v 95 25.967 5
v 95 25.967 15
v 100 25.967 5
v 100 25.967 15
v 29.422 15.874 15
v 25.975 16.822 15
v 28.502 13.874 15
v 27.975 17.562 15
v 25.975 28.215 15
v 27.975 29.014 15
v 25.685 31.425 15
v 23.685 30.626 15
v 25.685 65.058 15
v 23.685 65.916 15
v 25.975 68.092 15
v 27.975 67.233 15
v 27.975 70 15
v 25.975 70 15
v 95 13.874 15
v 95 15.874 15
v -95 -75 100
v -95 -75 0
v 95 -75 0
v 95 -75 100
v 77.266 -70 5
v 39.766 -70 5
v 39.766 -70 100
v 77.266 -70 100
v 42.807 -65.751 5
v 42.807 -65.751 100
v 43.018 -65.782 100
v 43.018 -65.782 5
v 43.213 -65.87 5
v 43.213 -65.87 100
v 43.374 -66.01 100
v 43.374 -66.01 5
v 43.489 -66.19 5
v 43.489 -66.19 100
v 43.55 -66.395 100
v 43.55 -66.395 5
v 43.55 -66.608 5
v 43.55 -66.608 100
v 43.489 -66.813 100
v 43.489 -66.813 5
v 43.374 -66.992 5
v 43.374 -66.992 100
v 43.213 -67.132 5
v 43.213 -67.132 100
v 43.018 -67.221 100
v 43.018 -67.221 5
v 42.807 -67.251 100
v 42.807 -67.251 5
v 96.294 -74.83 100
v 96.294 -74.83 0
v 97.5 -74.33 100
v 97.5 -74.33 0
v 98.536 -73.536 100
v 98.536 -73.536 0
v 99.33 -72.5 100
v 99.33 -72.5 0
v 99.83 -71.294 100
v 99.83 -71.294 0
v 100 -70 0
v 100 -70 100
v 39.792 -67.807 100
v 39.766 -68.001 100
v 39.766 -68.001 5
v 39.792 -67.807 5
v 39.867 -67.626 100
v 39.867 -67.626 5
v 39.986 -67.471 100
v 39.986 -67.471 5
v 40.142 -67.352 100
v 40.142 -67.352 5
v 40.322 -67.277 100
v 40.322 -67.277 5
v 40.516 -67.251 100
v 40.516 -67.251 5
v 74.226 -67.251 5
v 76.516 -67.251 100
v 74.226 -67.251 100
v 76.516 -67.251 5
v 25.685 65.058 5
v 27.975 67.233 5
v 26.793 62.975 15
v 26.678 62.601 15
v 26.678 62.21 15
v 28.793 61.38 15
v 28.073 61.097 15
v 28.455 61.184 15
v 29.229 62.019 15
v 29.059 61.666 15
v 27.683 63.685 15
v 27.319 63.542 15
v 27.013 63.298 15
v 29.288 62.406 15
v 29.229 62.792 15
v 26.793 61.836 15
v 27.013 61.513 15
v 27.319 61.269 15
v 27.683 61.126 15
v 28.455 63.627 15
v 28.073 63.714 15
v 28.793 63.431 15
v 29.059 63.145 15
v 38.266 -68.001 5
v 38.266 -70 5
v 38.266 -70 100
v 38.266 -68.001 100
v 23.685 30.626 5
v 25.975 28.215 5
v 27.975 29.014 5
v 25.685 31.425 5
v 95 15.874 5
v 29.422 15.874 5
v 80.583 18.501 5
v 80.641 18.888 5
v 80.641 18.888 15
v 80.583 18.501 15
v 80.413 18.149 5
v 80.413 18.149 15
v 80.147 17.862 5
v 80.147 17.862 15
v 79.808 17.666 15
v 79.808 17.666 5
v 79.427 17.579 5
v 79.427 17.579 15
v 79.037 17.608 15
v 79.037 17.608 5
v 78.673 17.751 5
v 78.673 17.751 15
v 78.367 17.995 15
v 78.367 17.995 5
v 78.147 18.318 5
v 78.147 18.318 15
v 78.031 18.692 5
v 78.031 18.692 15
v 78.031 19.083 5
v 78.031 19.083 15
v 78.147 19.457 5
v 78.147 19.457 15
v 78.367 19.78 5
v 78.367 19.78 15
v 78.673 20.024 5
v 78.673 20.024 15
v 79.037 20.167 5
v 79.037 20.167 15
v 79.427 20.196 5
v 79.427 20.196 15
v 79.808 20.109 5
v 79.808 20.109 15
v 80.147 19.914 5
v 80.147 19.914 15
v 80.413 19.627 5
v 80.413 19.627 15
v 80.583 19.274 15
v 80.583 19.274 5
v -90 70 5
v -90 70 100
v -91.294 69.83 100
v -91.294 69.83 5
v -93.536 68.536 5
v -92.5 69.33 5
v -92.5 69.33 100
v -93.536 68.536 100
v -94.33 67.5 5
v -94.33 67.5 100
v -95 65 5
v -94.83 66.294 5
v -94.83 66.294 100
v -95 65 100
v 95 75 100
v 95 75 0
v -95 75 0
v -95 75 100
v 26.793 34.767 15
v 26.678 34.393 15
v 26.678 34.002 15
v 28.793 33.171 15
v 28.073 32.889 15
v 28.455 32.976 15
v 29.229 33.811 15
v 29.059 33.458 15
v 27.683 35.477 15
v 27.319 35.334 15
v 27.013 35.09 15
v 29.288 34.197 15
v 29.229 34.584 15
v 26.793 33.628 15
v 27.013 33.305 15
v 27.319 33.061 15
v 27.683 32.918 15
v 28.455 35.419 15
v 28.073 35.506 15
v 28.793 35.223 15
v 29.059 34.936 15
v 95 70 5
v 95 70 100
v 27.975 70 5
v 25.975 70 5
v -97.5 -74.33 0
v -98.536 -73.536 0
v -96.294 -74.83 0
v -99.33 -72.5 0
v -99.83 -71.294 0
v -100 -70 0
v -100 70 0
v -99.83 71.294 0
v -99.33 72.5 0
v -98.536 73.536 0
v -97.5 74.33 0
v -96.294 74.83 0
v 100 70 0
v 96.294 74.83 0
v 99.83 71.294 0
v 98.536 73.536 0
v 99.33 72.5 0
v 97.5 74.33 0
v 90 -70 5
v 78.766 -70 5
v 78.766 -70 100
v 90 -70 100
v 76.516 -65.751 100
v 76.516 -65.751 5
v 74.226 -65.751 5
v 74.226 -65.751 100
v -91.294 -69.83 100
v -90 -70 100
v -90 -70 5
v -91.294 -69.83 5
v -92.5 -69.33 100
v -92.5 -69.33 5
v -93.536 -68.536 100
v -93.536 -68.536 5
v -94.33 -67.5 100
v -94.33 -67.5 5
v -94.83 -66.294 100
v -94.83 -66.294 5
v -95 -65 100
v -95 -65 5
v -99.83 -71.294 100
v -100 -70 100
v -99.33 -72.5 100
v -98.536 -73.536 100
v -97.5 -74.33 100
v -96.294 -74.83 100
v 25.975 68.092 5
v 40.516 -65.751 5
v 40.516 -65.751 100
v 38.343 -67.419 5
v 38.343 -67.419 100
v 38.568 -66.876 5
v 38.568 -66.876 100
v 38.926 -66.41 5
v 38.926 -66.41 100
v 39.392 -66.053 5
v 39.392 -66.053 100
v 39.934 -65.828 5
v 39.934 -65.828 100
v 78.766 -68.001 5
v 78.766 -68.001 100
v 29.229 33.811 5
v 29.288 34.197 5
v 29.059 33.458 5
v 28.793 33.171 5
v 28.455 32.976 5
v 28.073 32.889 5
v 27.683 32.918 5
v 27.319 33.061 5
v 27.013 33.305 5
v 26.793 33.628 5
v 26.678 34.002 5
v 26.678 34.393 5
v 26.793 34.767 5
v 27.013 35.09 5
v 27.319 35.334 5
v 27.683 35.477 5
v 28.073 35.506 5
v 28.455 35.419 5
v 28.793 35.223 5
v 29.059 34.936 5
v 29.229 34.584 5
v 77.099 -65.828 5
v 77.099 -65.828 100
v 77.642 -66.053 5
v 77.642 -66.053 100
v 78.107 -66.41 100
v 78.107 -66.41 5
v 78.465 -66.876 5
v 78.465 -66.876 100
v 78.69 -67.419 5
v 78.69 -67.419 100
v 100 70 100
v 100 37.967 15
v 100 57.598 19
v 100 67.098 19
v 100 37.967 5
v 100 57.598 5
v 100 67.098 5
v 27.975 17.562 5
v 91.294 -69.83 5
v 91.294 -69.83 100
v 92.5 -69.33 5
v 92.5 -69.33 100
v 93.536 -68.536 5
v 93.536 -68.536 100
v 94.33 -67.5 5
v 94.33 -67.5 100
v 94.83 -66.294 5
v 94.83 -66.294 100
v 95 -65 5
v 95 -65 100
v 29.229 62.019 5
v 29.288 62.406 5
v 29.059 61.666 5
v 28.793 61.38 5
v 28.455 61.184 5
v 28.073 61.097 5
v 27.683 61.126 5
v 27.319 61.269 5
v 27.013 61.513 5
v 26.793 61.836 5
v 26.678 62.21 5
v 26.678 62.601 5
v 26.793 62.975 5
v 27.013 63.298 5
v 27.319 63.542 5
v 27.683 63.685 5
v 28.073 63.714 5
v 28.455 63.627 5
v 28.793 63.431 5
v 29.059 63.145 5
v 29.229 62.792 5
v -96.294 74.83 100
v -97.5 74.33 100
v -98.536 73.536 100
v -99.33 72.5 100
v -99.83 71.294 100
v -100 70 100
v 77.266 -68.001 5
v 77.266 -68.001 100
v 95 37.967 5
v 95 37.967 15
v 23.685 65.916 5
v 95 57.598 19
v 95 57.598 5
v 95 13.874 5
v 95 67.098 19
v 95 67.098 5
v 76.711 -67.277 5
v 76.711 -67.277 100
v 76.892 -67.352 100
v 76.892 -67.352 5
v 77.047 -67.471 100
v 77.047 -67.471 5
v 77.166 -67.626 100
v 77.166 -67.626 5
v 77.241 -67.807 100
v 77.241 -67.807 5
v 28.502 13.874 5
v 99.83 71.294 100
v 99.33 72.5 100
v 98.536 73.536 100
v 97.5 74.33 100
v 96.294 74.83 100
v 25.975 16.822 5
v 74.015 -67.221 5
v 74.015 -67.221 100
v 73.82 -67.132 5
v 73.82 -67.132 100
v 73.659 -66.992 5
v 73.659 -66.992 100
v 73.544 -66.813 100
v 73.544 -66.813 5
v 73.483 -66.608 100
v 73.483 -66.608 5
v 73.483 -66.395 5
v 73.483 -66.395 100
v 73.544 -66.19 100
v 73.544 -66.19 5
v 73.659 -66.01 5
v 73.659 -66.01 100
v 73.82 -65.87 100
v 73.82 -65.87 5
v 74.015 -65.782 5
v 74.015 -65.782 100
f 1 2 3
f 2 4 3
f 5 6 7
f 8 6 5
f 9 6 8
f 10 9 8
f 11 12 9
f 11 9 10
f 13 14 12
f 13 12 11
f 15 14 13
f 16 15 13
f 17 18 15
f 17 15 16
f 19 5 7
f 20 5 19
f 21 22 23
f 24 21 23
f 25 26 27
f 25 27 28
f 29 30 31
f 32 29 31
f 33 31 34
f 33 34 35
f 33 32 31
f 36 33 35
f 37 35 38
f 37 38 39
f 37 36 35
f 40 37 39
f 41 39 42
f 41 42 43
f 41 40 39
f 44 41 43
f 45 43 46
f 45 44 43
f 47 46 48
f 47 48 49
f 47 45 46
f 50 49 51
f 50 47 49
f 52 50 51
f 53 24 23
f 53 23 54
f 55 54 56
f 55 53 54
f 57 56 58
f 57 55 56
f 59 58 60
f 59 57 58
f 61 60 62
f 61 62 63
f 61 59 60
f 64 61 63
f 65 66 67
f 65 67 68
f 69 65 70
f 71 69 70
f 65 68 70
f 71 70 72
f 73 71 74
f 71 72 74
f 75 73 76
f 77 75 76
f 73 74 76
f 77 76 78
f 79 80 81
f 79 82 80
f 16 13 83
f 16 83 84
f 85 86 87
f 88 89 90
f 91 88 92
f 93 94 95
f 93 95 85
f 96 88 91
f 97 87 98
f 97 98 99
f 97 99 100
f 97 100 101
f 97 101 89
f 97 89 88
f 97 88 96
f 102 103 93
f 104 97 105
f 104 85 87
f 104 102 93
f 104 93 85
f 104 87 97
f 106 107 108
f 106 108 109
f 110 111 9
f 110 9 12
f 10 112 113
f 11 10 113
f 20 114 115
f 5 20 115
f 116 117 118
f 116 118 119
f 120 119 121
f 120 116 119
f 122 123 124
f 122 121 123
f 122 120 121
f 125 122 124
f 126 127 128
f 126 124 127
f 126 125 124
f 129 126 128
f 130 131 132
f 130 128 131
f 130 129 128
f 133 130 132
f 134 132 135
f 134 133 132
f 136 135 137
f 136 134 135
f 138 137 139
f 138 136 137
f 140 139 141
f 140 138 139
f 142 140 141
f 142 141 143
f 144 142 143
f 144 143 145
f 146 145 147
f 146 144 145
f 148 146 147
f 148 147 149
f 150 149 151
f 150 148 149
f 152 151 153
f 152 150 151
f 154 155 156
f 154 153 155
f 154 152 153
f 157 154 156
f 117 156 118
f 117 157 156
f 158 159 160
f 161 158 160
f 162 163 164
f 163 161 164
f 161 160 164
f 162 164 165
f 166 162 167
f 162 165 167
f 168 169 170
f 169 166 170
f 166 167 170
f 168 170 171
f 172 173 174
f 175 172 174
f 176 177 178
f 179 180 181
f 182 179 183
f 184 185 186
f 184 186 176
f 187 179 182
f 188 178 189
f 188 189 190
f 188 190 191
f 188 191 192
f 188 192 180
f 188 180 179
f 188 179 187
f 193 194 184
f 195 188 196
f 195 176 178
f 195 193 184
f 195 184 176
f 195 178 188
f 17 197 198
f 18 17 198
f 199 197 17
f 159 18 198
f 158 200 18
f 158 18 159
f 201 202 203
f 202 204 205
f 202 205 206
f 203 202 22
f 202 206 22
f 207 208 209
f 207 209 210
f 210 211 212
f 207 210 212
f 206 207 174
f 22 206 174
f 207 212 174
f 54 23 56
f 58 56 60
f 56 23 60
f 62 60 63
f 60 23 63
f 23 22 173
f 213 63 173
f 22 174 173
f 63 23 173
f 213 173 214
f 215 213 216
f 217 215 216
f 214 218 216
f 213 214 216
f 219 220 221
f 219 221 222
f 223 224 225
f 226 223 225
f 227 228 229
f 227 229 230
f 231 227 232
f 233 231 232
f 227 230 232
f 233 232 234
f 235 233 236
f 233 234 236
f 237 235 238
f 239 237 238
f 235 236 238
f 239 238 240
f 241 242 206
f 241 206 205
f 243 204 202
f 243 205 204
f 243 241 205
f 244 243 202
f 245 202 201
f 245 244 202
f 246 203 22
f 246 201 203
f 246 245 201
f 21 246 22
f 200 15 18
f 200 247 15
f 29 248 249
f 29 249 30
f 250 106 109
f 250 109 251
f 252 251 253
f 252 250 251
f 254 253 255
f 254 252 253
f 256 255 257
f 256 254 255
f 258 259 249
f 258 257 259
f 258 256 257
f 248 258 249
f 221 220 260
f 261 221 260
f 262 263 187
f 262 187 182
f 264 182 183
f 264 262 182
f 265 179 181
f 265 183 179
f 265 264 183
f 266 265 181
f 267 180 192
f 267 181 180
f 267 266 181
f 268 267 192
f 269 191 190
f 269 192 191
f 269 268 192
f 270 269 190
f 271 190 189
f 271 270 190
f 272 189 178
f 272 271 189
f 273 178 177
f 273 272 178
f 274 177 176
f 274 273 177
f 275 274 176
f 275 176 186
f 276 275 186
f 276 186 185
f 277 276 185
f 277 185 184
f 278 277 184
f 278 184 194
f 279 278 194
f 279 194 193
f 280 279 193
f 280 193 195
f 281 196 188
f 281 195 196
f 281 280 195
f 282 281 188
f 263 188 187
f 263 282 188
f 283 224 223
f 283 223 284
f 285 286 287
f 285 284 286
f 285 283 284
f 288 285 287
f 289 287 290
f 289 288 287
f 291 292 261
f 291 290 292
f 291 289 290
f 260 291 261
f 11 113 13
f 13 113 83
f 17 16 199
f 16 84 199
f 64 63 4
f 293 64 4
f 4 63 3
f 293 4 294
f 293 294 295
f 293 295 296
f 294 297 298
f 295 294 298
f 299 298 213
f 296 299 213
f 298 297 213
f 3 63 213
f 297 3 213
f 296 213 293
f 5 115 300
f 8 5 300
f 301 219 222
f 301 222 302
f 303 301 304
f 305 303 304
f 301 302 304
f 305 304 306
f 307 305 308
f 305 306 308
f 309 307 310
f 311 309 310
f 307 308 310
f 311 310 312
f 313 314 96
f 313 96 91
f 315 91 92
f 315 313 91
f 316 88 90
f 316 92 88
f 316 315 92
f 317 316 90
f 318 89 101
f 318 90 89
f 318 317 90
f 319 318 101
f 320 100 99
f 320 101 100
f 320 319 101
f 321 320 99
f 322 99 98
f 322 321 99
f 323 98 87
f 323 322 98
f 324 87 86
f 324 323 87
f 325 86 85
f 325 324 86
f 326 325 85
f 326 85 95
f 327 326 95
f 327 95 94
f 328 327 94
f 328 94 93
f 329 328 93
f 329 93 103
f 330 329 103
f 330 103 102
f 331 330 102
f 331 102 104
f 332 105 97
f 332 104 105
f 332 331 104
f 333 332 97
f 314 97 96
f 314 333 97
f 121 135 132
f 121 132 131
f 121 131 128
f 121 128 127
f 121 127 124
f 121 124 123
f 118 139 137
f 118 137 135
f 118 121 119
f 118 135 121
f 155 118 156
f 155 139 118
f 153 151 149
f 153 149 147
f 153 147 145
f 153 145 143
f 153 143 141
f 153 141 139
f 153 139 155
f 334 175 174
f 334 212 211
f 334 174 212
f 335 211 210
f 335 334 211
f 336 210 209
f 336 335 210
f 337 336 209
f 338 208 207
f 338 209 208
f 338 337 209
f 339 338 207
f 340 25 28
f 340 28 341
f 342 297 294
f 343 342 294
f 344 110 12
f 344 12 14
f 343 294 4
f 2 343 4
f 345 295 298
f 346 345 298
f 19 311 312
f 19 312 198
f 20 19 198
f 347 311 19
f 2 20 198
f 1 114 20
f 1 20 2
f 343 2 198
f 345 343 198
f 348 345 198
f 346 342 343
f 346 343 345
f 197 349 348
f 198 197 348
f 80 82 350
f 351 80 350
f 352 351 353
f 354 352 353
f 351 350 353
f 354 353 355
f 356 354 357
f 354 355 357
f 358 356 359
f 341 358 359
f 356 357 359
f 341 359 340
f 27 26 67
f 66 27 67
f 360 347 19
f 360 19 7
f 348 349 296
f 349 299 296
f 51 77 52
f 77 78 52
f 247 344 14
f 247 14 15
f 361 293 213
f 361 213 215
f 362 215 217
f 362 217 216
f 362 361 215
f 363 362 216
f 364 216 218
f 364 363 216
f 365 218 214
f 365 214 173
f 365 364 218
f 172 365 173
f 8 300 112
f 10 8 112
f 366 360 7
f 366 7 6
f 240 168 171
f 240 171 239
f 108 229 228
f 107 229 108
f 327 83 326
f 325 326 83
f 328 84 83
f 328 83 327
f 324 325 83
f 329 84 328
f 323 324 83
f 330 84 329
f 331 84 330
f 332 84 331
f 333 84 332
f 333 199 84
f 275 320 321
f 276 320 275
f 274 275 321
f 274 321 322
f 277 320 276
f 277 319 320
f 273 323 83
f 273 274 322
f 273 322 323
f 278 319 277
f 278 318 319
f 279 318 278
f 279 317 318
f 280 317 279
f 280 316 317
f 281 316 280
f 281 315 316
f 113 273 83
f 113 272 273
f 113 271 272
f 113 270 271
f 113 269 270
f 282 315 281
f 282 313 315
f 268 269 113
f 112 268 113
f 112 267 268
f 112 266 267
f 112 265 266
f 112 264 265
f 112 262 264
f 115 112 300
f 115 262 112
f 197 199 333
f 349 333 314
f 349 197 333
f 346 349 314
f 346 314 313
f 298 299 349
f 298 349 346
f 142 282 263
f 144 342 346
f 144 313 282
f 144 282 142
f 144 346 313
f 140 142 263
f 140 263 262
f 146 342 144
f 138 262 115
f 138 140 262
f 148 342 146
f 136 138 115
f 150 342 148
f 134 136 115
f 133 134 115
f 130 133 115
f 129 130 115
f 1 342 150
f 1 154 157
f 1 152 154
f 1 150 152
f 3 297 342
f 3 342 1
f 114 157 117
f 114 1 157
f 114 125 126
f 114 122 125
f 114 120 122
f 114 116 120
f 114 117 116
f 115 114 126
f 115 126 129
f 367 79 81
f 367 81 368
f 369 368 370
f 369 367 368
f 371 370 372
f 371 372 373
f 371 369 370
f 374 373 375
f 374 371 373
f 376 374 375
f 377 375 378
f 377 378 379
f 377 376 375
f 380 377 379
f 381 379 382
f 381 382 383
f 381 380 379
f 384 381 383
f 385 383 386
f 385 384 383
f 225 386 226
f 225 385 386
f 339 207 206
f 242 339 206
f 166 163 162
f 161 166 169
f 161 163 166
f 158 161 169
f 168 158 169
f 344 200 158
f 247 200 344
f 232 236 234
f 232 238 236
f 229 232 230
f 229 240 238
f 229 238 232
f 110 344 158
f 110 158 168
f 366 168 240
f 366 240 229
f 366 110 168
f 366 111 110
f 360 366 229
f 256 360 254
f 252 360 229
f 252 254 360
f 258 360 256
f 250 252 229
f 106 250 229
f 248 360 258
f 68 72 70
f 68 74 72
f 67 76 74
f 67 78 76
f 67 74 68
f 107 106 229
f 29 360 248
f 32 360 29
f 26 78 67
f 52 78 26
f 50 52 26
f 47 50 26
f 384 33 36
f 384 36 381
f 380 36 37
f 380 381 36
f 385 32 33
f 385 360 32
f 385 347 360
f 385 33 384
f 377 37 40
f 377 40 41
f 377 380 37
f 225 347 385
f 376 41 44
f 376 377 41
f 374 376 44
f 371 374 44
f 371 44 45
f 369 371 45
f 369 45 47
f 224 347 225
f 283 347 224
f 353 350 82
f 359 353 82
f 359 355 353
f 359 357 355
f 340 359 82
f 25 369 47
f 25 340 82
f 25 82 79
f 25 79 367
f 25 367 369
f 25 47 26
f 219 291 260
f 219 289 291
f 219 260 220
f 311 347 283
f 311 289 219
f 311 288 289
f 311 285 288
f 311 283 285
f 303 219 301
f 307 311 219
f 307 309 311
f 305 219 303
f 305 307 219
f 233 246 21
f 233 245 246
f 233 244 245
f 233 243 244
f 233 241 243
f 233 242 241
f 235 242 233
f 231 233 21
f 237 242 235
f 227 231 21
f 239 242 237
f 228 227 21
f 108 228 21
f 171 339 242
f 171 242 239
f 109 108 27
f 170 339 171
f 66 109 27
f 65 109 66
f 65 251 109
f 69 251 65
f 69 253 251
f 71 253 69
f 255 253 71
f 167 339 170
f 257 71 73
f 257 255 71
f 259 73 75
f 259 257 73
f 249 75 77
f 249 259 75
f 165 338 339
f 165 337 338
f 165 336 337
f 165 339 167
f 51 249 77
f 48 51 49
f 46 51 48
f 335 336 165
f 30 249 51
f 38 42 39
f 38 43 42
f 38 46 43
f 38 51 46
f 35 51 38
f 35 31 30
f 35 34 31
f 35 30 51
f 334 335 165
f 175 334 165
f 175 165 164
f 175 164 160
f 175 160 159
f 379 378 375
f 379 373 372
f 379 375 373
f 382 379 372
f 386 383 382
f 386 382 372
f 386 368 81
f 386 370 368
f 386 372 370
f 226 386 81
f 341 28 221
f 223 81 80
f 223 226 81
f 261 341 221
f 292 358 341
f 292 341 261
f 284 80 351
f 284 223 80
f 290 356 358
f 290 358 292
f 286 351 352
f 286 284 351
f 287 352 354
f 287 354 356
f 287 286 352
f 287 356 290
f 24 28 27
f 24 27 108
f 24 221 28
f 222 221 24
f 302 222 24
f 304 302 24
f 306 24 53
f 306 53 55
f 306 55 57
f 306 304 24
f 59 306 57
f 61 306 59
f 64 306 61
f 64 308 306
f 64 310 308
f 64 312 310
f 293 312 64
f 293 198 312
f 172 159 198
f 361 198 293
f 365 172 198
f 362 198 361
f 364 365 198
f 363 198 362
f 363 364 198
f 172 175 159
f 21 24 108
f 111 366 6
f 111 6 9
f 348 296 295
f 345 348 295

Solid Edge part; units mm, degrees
sketch "Sketch1" plane through (0, 0, 0) normal (0, 0, 1) x (1, 0, 0)
  line L0 (-100, -75) -> (100, -75)
  line L1 (100, -75) -> (100, 75)
  line L2 (100, 75) -> (-100, 75)
  line L3 (-100, 75) -> (-100, -75)
extrude "Protrusion1" add sketch "Sketch1" along normal blind 100
shell "Parede" thickness 5 removed faces 1 at (-68.6667, -48.5, 100)
sketch "Sketch2" plane through (100, 0, 50) normal (1, 0, 0) x (0, 0, -1)
  line L0 (45, 67.0982) -> (31, 67.0982)
  line L1 (31, 67.0982) -> (31, 57.5982)
  line L2 (31, 57.5982) -> (45, 57.5982)
  line L3 (45, 67.0982) -> (45, 57.5982)
  line L4 (45, 37.9671) -> (45, 25.9671)
  line L5 (35, 25.9671) -> (45, 25.9671)
  line L6 (35, 37.9671) -> (35, 25.9671)
  line L7 (45, 37.9671) -> (35, 37.9671)
extrude "Cutout1" cut sketch "Sketch2" against normal up to next
sketch "Sketch3" plane through (2.5, 0, 5) normal (0, 0, 1) x (1, 0, 0)
  line L0 (25.4753, 67.2334) -> (25.4753, 70)
  line L1 (23.4753, 70) -> (25.4753, 70)
  line L2 (23.4753, 68.092) -> (23.4753, 70)
  line L3 (21.1849, 65.9162) -> (23.4753, 68.092)
  line L4 (21.1849, 30.6261) -> (21.1849, 65.9162)
  line L5 (23.4753, 28.2151) -> (21.1849, 30.6261)
  line L6 (23.4753, 16.8218) -> (23.4753, 28.2151)
  line L7 (26.002, 13.874) -> (23.4753, 16.8218)
  line L8 (92.5, 13.874) -> (26.002, 13.874)
  line L9 (92.5, 15.874) -> (92.5, 13.874)
  line L10 (92.5, 15.874) -> (26.9219, 15.874)
  line L11 (26.9219, 15.874) -> (25.4753, 17.5616)
  line L12 (25.4753, 17.5616) -> (25.4753, 29.0137)
  line L13 (25.4753, 29.0137) -> (23.1849, 31.4246)
  line L14 (23.1849, 31.4246) -> (23.1849, 65.0575)
  line L15 (23.1849, 65.0575) -> (25.4753, 67.2334)
  circle A0 centre (25.4753, 62.4055) radius 1.3122
  circle A1 centre (25.4753, 34.1973) radius 1.3122
  circle A2 centre (76.8288, 18.8877) radius 1.3122
  dimension "D1" = 2
extrude "Parede_Arduino" add sketch "Sketch3" along normal blind 10
fillet "Round_1" radius 5 7 edges at (-100, -75, 50) (100, -75, 50) (100, 75, 50) (-100, 75, 50) (-95, -70, 52.5) (-95, 70, 52.5) (95, -70, 52.5)
sketch "Sketch4" plane through (0, 0, 5) normal (0, 0, 1) x (-1, 0, 0)
  line L0 (-38.2665, 70) -> (-38.2665, 68.0013)
  arc A0 (-40.5165, 65.7513) -> (-38.2665, 68.0013) centre (-40.5165, 68.0013) ccw
  line L1 (-40.5165, 65.7513) -> (-42.8072, 65.7513)
  arc A1 (-42.8072, 65.7513) -> (-42.8072, 67.2513) centre (-42.8072, 66.5013) cw
  line L2 (-40.5165, 67.2513) -> (-42.8072, 67.2513)
  arc A2 (-39.7665, 68.0013) -> (-40.5165, 67.2513) centre (-40.5165, 68.0013) cw
  line L3 (-39.7665, 70) -> (-39.7665, 68.0013)
  line L4 (-39.7665, 70) -> (-38.2665, 70)
  line L5 (-77.2665, 70) -> (-77.2665, 68.0013)
  arc A3 (-76.5165, 67.2513) -> (-77.2665, 68.0013) centre (-76.5165, 68.0013) cw
  line L6 (-76.5165, 67.2513) -> (-74.2258, 67.2513)
  arc A4 (-74.2258, 67.2513) -> (-74.2258, 65.7513) centre (-74.2258, 66.5013) cw
  line L7 (-76.5165, 65.7513) -> (-74.2258, 65.7513)
  arc A5 (-78.7665, 68.0013) -> (-76.5165, 65.7513) centre (-76.5165, 68.0013) ccw
  line L8 (-78.7665, 70) -> (-78.7665, 68.0013)
  line L9 (-78.7665, 70) -> (-77.2665, 70)
extrude "Protrusion2" add sketch "Sketch4" along normal up to vertex (95 mm away)
